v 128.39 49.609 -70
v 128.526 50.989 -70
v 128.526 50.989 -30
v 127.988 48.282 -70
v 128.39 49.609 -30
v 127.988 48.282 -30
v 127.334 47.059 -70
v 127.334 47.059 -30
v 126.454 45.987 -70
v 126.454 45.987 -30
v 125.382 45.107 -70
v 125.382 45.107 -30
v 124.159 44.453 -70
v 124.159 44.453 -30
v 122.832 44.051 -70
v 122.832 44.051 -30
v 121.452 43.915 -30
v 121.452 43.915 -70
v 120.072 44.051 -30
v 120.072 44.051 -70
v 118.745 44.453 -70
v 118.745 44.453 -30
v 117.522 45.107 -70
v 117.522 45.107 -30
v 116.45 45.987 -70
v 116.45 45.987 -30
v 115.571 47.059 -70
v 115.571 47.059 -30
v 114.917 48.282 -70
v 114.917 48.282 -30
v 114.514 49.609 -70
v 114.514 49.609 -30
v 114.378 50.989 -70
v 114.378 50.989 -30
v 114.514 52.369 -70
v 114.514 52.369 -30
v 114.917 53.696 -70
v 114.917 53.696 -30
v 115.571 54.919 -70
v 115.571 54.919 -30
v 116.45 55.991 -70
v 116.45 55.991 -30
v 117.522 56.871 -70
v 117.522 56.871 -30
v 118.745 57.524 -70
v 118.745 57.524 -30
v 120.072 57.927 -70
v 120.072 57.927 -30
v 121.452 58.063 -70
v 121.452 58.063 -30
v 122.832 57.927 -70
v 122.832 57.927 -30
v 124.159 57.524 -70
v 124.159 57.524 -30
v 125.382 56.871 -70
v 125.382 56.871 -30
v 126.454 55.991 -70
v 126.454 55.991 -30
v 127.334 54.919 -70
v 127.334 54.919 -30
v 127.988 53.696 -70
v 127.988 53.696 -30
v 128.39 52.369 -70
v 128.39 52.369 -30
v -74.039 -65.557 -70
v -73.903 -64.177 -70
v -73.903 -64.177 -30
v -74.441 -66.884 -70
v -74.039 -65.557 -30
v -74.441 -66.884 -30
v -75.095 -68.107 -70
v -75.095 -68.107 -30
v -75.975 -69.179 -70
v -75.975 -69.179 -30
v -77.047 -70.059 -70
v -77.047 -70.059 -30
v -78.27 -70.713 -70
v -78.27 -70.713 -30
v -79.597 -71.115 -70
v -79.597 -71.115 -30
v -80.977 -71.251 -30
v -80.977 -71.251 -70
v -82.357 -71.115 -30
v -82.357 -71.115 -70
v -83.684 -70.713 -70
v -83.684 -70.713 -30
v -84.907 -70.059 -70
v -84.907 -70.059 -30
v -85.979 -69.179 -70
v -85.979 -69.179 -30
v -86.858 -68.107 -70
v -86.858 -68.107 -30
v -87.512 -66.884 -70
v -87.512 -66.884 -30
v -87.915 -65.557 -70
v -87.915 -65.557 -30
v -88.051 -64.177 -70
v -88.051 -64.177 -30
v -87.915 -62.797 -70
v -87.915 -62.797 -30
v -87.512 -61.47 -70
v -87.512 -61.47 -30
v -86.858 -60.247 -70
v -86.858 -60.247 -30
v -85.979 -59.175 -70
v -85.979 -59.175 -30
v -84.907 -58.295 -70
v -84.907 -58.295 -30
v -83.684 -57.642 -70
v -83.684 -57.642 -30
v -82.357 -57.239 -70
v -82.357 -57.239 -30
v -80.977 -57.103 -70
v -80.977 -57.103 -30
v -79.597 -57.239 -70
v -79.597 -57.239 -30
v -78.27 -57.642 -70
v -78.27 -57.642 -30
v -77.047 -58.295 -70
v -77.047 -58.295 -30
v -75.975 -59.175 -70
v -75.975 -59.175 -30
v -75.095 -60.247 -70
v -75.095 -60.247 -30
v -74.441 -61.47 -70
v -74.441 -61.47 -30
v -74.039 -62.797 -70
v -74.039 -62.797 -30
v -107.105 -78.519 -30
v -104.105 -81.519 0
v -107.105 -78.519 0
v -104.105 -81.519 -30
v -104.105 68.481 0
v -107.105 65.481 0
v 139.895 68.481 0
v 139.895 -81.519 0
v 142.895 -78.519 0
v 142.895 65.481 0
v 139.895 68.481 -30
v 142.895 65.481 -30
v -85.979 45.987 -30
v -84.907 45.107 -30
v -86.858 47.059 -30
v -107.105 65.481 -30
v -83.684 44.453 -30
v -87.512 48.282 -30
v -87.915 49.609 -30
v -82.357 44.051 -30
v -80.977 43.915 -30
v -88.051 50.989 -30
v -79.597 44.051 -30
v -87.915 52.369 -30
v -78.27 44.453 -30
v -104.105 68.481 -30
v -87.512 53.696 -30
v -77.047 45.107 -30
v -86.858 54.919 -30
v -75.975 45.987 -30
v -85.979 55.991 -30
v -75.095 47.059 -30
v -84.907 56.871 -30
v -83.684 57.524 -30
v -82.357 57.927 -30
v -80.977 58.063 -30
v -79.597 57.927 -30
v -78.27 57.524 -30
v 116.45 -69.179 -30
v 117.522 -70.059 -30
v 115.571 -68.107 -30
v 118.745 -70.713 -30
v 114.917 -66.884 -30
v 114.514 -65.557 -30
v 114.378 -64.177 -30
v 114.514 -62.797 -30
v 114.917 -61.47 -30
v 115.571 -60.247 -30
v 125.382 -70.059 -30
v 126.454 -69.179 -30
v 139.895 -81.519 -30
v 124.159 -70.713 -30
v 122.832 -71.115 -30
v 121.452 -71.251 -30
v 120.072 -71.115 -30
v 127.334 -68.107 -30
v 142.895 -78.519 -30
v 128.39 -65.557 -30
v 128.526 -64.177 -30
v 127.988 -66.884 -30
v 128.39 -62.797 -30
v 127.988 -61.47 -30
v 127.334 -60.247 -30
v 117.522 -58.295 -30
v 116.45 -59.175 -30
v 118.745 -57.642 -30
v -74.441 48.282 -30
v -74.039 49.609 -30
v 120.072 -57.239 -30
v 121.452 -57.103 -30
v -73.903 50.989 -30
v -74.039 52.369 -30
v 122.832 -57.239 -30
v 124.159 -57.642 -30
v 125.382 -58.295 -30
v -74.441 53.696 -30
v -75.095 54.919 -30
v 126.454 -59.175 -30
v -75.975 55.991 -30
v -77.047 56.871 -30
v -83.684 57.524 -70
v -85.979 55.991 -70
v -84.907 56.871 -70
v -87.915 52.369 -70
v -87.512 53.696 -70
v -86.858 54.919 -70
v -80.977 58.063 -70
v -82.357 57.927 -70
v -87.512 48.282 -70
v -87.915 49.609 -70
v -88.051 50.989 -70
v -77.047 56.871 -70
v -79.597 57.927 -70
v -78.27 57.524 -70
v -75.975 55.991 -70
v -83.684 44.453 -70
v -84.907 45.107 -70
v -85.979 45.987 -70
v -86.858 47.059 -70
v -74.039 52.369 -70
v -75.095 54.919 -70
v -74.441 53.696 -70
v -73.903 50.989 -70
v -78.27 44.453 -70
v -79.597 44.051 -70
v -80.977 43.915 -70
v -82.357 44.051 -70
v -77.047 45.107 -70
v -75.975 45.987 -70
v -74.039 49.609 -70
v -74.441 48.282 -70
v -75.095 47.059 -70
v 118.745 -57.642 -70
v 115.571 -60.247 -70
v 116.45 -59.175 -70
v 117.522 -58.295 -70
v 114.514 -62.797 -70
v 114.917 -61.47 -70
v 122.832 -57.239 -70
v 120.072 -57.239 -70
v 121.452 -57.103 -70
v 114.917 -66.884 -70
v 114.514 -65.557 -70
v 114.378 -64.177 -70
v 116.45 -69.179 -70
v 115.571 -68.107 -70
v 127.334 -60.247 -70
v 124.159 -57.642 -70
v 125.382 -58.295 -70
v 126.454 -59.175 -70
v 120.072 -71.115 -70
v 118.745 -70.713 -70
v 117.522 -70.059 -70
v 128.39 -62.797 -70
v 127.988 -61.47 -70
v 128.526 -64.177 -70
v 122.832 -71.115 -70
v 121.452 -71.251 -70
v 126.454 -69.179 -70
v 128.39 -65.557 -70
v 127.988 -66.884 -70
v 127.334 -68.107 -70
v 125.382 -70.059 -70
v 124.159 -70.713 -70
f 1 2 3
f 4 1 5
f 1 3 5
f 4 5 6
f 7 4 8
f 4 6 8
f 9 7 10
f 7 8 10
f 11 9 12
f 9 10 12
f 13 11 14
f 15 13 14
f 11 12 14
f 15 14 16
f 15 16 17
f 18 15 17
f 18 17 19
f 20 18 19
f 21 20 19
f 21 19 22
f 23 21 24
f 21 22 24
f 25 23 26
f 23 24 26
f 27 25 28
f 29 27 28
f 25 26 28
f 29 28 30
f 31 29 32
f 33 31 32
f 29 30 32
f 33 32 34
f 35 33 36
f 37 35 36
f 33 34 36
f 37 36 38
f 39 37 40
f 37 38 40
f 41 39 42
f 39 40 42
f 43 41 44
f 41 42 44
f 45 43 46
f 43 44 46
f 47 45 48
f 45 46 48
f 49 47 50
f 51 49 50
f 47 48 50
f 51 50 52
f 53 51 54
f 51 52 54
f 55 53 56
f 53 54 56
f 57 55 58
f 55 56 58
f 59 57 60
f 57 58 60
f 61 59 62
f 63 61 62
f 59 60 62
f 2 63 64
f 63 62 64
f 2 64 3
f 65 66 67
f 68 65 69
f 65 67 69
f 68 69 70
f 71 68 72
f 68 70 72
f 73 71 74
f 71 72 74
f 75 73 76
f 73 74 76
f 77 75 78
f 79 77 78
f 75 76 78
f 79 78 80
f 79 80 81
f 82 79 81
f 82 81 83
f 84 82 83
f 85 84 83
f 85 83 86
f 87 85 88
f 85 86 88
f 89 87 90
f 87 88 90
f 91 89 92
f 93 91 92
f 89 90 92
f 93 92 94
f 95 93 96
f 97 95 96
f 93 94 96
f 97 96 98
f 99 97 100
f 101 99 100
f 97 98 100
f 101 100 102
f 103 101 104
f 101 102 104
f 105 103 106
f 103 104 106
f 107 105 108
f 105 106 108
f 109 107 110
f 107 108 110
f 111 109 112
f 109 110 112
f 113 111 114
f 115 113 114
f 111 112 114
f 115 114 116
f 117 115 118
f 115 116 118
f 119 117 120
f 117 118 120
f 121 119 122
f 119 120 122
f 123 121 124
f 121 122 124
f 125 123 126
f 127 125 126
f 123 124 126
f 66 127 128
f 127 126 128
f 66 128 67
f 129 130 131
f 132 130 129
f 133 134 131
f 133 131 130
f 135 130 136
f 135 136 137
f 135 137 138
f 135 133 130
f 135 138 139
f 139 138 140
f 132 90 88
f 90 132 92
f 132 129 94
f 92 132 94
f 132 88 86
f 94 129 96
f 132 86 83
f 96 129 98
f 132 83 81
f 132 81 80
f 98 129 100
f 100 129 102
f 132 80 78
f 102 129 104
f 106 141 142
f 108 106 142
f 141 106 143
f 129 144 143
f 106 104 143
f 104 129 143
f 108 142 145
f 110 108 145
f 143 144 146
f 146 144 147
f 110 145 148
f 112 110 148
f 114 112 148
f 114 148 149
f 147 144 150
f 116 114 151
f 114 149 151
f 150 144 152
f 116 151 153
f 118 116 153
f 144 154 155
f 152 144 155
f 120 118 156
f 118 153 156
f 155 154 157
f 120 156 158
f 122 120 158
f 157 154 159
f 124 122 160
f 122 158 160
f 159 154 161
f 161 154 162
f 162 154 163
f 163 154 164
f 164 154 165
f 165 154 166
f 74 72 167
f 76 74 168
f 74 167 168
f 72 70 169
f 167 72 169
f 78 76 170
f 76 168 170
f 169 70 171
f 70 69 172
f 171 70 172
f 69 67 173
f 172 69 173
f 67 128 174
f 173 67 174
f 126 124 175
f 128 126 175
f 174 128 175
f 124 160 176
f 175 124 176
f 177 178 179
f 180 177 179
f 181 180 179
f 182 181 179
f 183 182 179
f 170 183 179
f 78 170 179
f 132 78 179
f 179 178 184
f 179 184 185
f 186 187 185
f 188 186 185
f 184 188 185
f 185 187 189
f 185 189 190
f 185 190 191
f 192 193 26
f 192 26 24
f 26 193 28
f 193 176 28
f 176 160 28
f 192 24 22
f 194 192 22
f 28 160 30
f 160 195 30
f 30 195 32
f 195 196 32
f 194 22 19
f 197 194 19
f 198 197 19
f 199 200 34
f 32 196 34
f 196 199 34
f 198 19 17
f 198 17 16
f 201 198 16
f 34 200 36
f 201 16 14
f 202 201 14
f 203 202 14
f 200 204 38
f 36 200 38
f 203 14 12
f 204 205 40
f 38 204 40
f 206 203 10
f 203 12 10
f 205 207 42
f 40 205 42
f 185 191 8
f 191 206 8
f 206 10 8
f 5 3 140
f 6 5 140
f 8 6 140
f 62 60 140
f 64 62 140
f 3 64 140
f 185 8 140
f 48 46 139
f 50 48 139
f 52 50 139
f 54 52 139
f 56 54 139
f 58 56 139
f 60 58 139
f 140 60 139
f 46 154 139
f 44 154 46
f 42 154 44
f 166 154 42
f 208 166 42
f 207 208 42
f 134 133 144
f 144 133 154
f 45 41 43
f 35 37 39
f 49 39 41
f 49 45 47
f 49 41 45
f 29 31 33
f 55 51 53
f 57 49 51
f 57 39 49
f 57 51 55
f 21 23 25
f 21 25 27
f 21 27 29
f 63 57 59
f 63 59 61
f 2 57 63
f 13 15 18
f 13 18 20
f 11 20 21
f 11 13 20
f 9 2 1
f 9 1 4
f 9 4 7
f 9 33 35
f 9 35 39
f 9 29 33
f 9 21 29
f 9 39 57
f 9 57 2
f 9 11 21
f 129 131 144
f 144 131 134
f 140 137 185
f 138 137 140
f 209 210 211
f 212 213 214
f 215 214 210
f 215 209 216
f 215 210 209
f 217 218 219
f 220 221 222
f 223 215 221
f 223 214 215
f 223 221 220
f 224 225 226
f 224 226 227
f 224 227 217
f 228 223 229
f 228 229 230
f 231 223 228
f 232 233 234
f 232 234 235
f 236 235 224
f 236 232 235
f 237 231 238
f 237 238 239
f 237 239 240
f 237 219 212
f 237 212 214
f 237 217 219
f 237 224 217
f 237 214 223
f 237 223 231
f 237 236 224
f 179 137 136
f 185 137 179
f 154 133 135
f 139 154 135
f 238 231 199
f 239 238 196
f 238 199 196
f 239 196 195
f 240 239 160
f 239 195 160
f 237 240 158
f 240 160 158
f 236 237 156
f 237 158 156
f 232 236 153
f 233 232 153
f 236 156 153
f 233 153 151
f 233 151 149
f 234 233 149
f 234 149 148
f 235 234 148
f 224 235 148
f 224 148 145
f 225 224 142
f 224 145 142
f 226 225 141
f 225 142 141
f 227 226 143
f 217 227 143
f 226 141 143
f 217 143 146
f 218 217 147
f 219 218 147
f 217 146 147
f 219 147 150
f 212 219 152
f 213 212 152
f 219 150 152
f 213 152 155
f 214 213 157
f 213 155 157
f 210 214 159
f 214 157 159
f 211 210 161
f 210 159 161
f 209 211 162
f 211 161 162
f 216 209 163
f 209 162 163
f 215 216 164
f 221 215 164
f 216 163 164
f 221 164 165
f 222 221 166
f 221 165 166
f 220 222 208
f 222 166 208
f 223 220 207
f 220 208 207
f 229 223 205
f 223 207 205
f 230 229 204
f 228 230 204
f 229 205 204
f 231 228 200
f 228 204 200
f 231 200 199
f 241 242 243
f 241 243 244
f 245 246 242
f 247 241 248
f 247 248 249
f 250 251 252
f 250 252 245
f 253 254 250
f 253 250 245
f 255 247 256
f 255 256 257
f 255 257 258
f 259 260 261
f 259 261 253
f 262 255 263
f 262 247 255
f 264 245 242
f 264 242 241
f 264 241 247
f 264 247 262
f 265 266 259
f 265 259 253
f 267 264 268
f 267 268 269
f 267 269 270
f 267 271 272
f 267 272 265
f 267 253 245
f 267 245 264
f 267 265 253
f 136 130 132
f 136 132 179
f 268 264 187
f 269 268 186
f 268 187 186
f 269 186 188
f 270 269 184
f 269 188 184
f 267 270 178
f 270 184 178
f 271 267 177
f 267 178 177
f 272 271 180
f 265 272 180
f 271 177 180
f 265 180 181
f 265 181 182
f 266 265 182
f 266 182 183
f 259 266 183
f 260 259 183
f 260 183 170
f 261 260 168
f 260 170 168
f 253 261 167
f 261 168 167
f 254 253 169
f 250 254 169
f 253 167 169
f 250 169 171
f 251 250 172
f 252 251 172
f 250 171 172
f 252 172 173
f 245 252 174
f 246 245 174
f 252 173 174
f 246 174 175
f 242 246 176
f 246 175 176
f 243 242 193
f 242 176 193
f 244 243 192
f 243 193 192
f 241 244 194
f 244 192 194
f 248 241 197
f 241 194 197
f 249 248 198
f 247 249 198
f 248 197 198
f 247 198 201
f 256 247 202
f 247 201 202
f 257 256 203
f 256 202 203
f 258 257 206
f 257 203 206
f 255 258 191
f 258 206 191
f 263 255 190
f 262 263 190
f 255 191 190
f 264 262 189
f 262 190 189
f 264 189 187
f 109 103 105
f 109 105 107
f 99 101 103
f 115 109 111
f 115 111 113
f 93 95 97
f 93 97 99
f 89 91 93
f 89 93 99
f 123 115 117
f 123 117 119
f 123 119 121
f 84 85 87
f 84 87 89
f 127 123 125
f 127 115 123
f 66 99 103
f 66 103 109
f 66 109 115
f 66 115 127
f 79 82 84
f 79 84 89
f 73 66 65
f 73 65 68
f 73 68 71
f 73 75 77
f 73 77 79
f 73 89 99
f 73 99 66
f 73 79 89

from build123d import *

# Parameters (mm, degrees)
F0_W     = 250
F0_H     = 150
F1_DEPTH = 30
F2_R     = 7.0739
F3_DEPTH = 40
F4_SIZE  = 3


with BuildPart() as f1:
    # F0 (on Top) → F1 (new body)
    with BuildSketch(Plane.XY):
        with Locations((17.895456, -6.518978)):
            Rectangle(F0_W, F0_H)
    extrude(amount=-F1_DEPTH)

    # F2 (on face) → F3 (join)
    with BuildSketch(Plane(origin=(0, 0, -30), x_dir=(1, 0, 0), z_dir=(0, 0, -1))):
        with Locations((-80.976687, 64.177193)):
            Circle(F2_R)
        with Locations((121.452317, 64.177193)):
            Circle(F2_R)
        with Locations((121.452317, -50.98886)):
            Circle(F2_R)
        with Locations((-80.976687, -50.98886)):
            Circle(F2_R)
    extrude(amount=F3_DEPTH)

    # F4
    f4_edges = [f1.edges().sort_by_distance(p)[0] for p in [
        (-107.104544, 68.481022, -15),
        (142.895456, 68.481022, -15),
        (142.895456, -81.518978, -15),
        (-107.104544, -81.518978, -15),
    ]]
    chamfer(f4_edges, length=F4_SIZE)


solid = f1.part
